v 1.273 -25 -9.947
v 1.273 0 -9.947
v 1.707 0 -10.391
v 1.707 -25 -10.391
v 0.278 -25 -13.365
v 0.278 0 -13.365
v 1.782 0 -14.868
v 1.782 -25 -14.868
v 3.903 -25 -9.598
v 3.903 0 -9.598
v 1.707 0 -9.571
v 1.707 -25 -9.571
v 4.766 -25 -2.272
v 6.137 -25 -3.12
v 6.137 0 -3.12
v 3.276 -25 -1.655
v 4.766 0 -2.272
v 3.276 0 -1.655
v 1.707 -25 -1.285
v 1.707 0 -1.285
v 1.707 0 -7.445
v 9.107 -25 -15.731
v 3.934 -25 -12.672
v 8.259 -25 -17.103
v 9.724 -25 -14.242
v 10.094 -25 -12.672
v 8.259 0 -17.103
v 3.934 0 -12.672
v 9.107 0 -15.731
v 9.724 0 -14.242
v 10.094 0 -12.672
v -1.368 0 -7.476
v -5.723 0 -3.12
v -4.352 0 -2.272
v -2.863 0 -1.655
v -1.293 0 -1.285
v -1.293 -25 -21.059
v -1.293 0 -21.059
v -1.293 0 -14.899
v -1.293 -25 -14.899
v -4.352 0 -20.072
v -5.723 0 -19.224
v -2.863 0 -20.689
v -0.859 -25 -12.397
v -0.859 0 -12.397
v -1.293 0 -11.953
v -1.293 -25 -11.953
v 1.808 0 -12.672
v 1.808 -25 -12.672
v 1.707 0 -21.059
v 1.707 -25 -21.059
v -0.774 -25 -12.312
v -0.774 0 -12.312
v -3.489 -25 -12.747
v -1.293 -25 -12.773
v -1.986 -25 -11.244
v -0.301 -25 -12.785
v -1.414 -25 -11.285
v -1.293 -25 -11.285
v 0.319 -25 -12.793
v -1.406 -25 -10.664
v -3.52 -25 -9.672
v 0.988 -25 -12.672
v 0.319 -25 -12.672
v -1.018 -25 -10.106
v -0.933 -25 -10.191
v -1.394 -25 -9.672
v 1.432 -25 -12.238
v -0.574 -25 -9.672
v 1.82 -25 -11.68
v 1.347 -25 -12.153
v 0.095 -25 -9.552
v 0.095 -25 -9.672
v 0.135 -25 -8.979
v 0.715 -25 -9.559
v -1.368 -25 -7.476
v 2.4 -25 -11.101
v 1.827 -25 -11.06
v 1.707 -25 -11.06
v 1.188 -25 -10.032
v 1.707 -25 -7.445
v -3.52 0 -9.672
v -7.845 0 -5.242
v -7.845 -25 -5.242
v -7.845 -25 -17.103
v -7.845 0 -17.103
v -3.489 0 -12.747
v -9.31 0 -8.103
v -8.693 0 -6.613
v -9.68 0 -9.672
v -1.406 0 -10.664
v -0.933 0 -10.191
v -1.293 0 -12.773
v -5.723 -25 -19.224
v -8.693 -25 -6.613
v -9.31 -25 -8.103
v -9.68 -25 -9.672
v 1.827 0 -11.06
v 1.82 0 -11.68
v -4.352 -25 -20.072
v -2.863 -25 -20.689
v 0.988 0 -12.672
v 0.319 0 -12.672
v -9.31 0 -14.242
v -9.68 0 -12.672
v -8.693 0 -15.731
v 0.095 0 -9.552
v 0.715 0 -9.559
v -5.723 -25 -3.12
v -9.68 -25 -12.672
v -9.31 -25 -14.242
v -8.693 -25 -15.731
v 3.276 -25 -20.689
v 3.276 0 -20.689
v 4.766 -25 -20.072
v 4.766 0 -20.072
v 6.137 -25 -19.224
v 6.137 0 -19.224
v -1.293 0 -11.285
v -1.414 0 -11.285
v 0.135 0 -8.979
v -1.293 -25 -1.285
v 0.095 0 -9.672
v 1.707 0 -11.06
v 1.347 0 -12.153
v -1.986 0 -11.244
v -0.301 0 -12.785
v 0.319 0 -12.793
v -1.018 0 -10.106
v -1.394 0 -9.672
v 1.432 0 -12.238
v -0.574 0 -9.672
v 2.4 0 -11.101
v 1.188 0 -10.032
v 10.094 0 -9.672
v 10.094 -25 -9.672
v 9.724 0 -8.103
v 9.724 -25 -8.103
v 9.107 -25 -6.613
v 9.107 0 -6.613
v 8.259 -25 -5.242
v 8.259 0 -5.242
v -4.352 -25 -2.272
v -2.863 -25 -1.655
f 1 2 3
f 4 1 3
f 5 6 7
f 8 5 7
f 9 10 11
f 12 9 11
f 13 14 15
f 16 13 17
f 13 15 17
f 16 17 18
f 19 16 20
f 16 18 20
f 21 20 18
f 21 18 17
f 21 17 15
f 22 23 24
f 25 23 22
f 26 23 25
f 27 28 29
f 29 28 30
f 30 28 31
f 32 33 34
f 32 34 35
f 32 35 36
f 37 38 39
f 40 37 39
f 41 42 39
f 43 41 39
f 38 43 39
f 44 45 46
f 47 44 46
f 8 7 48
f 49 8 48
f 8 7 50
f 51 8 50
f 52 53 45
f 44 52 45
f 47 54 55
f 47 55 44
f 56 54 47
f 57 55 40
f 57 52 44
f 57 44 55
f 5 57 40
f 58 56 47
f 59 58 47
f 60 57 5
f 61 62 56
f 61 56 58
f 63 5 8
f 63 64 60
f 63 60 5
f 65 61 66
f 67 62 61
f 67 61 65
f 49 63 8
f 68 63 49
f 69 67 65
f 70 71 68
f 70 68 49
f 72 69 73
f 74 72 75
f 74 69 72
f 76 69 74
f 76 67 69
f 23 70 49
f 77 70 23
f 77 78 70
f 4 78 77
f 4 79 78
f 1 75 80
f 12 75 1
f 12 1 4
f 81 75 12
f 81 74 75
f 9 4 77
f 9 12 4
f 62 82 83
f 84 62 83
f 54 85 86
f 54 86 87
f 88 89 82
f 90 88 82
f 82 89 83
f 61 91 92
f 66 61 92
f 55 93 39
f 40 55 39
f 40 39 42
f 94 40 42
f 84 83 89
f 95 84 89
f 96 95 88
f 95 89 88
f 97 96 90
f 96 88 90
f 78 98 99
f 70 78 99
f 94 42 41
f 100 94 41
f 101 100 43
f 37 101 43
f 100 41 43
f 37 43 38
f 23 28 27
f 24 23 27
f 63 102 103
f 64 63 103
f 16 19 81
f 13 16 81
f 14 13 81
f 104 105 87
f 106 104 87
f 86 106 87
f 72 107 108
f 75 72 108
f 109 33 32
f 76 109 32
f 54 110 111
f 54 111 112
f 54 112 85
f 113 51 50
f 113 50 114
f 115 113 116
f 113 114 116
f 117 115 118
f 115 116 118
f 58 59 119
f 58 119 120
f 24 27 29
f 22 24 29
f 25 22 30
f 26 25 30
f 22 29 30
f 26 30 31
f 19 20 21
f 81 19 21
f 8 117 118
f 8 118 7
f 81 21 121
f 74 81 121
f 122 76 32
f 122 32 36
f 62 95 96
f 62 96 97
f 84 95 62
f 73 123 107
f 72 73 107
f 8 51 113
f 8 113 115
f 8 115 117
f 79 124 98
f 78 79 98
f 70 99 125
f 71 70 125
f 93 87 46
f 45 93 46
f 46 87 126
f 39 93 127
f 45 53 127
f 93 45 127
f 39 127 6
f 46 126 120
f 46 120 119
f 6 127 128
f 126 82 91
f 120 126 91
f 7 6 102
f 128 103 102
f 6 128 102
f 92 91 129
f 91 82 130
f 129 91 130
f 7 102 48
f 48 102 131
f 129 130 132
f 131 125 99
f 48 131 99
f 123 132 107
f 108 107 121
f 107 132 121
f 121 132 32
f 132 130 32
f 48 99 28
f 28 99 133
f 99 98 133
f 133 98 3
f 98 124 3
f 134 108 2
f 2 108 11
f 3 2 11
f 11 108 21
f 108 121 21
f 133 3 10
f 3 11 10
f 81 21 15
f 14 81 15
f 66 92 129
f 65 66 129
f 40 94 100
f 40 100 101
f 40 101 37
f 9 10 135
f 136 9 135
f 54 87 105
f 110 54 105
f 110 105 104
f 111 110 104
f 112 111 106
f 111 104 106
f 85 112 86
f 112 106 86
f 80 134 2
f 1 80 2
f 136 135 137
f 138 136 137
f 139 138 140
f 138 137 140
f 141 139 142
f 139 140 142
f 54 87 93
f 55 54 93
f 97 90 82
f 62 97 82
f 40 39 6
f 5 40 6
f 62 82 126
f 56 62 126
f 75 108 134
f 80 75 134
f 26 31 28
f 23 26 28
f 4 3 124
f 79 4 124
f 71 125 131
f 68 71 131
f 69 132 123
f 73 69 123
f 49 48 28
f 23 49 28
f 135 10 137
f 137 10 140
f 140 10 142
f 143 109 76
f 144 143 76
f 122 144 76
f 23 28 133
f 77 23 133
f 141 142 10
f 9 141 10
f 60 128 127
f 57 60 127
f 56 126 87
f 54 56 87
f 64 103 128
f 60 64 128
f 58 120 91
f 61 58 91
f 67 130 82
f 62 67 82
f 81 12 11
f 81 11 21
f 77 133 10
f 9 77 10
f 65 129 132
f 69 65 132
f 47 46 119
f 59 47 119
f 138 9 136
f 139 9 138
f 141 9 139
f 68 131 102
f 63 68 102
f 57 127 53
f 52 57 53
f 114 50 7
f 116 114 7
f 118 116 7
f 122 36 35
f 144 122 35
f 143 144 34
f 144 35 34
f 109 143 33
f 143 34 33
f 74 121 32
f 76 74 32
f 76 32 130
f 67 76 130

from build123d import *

# Parameters (mm, degrees)
F1_DEPTH = 25


with BuildPart() as f1:
    # F0 (on Front) → F1 (new body)
    with BuildSketch(Plane.XZ):
        Polygon((-1.2930655526, -11.2845433465), (-1.413538867, -11.2845433465), (-1.406060062, -10.6638031963), (-1.9858366428, -11.2435797771), (-1.2930655526, -11.9532477417), align=None)
        Polygon((-1.9858366428, -11.2435797771), (-1.406060062, -10.6638031963), (-1.3941121675, -9.6721290305), (-3.5198718555, -9.6721290305), align=None)
        Polygon((-1.3941121675, -9.6721290305), (-1.406060062, -10.6638031963), (-0.9332146495, -10.1909577839), (-1.0184021471, -10.1057702863), (-0.5741842638, -9.6721290305), align=None)
        Polygon((-1.2930655526, -12.7731756454), (-1.2930655526, -11.9532477417), (-1.9858366428, -11.2435797771), (-3.4889757333, -12.7467188677), align=None)
        Polygon((-0.8594242968, -12.3974656251), (-1.2930655526, -11.9532477417), (-1.2930655526, -12.7731756454), (-0.3013913868, -12.7851235399), (-0.7742367992, -12.3122781275), align=None)
        Polygon((-1.3676553897, -7.4762188498), (-1.3941121675, -9.6721290305), (-0.5741842638, -9.6721290305), (0.1354837008, -8.9793579403), align=None)
        Polygon((-0.3013913868, -12.7851235399), (-1.2930655526, -12.7731756454), (-1.2930655526, -14.8989353334), (0.2783851941, -13.3649001207), align=None)
        Polygon((0.1354837008, -8.9793579403), (-0.5741842638, -9.6721290305), (0.0945201314, -9.6721290305), (0.0945201314, -9.551655716), (0.7152602816, -9.5591345211), align=None)
        Polygon((0.3193487635, -12.792602345), (-0.3013913868, -12.7851235399), (0.2783851941, -13.3649001207), (0.9880531586, -12.6721290305), (0.3193487635, -12.6721290305), align=None)
        Polygon((1.7069344474, -7.4453227276), (0.1354837008, -8.9793579403), (0.7152602816, -9.5591345211), (1.7069344474, -9.5710824156), align=None)
        Polygon((0.9880531586, -12.6721290305), (0.2783851941, -13.3649001207), (1.7815242846, -14.8680392112), (1.8079810624, -12.6721290305), align=None)
        Polygon((1.7069344474, -9.5710824156), (0.7152602816, -9.5591345211), (1.188105694, -10.0319799335), (1.2732931916, -9.9467924359), (1.7069344474, -10.3910103193), align=None)
        Polygon((1.432271042, -12.2384877747), (0.9880531586, -12.6721290305), (1.8079810624, -12.6721290305), (1.8199289568, -11.6804548647), (1.3470835444, -12.1533002771), align=None)
        Polygon((3.9028446281, -9.5975391933), (1.7069344474, -9.5710824156), (1.7069344474, -10.3910103193), (2.3997055376, -11.1006782839), align=None)
        Polygon((1.8199289568, -11.6804548647), (1.8079810624, -12.6721290305), (3.9337407503, -12.6721290305), (2.3997055376, -11.1006782839), align=None)
        Polygon((2.3997055376, -11.1006782839), (1.7069344474, -10.3910103193), (1.7069344474, -11.0597147144), (1.8274077619, -11.0597147144), (1.8199289568, -11.6804548647), align=None)
    extrude(amount=F1_DEPTH)


with BuildPart() as f1b:
    # F0 (on Front) → F1, piece 2 (new body)
    with BuildSketch(Plane.XZ):
        with BuildLine():
            Line((-5.7234711079, -3.1204031317), (-1.3676553897, -7.4762188498))
            Line((-1.3676553897, -7.4762188498), (-1.2930655526, -1.2852690639))
            ThreePointArc((-1.2930655526, -1.2852690639), (-3.6198998762, -1.9333337054), (-5.7234711079, -3.1204031317))
        make_face()
    extrude(amount=F1_DEPTH)


with BuildPart() as f1c:
    # F0 (on Front) → F1, piece 3 (new body)
    with BuildSketch(Plane.XZ):
        with BuildLine():
            Line((1.7069344474, -1.2852690639), (1.7069344474, -7.4453227276))
            Line((1.7069344474, -7.4453227276), (6.1373400027, -3.1204031317))
            ThreePointArc((6.1373400027, -3.1204031317), (4.0337687711, -1.9333337054), (1.7069344474, -1.2852690639))
        make_face()
    extrude(amount=F1_DEPTH)


with BuildPart() as f1d:
    # F0 (on Front) → F1, piece 4 (new body)
    with BuildSketch(Plane.XZ):
        with BuildLine():
            Line((8.2586603463, -5.2417234752), (3.9028446281, -9.5975391933))
            Line((3.9028446281, -9.5975391933), (10.0937944141, -9.6721290305))
            ThreePointArc((10.0937944141, -9.6721290305), (9.4457297725, -7.3452947068), (8.2586603463, -5.2417234752))
        make_face()
    extrude(amount=F1_DEPTH)


with BuildPart() as f1e:
    # F0 (on Front) → F1, piece 5 (new body)
    with BuildSketch(Plane.XZ):
        with BuildLine():
            Line((10.0937944141, -12.6721290305), (3.9337407503, -12.6721290305))
            Line((3.9337407503, -12.6721290305), (8.2586603463, -17.1025345858))
            ThreePointArc((8.2586603463, -17.1025345858), (9.4457297725, -14.9989633541), (10.0937944141, -12.6721290305))
        make_face()
    extrude(amount=F1_DEPTH)


with BuildPart() as f1f:
    # F0 (on Front) → F1, piece 6 (new body)
    with BuildSketch(Plane.XZ):
        with BuildLine():
            Line((6.1373400027, -19.2238549293), (1.7815242846, -14.8680392112))
            Line((1.7815242846, -14.8680392112), (1.7069344474, -21.0589889971))
            ThreePointArc((1.7069344474, -21.0589889971), (4.0337687711, -20.4109243556), (6.1373400027, -19.2238549293))
        make_face()
    extrude(amount=F1_DEPTH)


with BuildPart() as f1g:
    # F0 (on Front) → F1, piece 7 (new body)
    with BuildSketch(Plane.XZ):
        with BuildLine():
            Line((-1.2930655526, -21.0589889971), (-1.2930655526, -14.8989353334))
            Line((-1.2930655526, -14.8989353334), (-5.7234711079, -19.2238549293))
            ThreePointArc((-5.7234711079, -19.2238549293), (-3.6198998762, -20.4109243556), (-1.2930655526, -21.0589889971))
        make_face()
    extrude(amount=F1_DEPTH)


with BuildPart() as f1h:
    # F0 (on Front) → F1, piece 8 (new body)
    with BuildSketch(Plane.XZ):
        with BuildLine():
            Line((-7.8447914514, -17.1025345858), (-3.4889757333, -12.7467188677))
            Line((-3.4889757333, -12.7467188677), (-9.6799255192, -12.6721290305))
            ThreePointArc((-9.6799255192, -12.6721290305), (-9.0318608777, -14.9989633541), (-7.8447914514, -17.1025345858))
        make_face()
    extrude(amount=F1_DEPTH)


with BuildPart() as f1i:
    # F0 (on Front) → F1, piece 9 (new body)
    with BuildSketch(Plane.XZ):
        with BuildLine():
            Line((-9.6799255192, -9.6721290305), (-3.5198718555, -9.6721290305))
            Line((-3.5198718555, -9.6721290305), (-7.8447914514, -5.2417234752))
            ThreePointArc((-7.8447914514, -5.2417234752), (-9.0318608777, -7.3452947068), (-9.6799255192, -9.6721290305))
        make_face()
    extrude(amount=F1_DEPTH)


solid = Compound([f1.part, f1b.part, f1c.part, f1d.part, f1e.part, f1f.part, f1g.part, f1h.part, f1i.part])
